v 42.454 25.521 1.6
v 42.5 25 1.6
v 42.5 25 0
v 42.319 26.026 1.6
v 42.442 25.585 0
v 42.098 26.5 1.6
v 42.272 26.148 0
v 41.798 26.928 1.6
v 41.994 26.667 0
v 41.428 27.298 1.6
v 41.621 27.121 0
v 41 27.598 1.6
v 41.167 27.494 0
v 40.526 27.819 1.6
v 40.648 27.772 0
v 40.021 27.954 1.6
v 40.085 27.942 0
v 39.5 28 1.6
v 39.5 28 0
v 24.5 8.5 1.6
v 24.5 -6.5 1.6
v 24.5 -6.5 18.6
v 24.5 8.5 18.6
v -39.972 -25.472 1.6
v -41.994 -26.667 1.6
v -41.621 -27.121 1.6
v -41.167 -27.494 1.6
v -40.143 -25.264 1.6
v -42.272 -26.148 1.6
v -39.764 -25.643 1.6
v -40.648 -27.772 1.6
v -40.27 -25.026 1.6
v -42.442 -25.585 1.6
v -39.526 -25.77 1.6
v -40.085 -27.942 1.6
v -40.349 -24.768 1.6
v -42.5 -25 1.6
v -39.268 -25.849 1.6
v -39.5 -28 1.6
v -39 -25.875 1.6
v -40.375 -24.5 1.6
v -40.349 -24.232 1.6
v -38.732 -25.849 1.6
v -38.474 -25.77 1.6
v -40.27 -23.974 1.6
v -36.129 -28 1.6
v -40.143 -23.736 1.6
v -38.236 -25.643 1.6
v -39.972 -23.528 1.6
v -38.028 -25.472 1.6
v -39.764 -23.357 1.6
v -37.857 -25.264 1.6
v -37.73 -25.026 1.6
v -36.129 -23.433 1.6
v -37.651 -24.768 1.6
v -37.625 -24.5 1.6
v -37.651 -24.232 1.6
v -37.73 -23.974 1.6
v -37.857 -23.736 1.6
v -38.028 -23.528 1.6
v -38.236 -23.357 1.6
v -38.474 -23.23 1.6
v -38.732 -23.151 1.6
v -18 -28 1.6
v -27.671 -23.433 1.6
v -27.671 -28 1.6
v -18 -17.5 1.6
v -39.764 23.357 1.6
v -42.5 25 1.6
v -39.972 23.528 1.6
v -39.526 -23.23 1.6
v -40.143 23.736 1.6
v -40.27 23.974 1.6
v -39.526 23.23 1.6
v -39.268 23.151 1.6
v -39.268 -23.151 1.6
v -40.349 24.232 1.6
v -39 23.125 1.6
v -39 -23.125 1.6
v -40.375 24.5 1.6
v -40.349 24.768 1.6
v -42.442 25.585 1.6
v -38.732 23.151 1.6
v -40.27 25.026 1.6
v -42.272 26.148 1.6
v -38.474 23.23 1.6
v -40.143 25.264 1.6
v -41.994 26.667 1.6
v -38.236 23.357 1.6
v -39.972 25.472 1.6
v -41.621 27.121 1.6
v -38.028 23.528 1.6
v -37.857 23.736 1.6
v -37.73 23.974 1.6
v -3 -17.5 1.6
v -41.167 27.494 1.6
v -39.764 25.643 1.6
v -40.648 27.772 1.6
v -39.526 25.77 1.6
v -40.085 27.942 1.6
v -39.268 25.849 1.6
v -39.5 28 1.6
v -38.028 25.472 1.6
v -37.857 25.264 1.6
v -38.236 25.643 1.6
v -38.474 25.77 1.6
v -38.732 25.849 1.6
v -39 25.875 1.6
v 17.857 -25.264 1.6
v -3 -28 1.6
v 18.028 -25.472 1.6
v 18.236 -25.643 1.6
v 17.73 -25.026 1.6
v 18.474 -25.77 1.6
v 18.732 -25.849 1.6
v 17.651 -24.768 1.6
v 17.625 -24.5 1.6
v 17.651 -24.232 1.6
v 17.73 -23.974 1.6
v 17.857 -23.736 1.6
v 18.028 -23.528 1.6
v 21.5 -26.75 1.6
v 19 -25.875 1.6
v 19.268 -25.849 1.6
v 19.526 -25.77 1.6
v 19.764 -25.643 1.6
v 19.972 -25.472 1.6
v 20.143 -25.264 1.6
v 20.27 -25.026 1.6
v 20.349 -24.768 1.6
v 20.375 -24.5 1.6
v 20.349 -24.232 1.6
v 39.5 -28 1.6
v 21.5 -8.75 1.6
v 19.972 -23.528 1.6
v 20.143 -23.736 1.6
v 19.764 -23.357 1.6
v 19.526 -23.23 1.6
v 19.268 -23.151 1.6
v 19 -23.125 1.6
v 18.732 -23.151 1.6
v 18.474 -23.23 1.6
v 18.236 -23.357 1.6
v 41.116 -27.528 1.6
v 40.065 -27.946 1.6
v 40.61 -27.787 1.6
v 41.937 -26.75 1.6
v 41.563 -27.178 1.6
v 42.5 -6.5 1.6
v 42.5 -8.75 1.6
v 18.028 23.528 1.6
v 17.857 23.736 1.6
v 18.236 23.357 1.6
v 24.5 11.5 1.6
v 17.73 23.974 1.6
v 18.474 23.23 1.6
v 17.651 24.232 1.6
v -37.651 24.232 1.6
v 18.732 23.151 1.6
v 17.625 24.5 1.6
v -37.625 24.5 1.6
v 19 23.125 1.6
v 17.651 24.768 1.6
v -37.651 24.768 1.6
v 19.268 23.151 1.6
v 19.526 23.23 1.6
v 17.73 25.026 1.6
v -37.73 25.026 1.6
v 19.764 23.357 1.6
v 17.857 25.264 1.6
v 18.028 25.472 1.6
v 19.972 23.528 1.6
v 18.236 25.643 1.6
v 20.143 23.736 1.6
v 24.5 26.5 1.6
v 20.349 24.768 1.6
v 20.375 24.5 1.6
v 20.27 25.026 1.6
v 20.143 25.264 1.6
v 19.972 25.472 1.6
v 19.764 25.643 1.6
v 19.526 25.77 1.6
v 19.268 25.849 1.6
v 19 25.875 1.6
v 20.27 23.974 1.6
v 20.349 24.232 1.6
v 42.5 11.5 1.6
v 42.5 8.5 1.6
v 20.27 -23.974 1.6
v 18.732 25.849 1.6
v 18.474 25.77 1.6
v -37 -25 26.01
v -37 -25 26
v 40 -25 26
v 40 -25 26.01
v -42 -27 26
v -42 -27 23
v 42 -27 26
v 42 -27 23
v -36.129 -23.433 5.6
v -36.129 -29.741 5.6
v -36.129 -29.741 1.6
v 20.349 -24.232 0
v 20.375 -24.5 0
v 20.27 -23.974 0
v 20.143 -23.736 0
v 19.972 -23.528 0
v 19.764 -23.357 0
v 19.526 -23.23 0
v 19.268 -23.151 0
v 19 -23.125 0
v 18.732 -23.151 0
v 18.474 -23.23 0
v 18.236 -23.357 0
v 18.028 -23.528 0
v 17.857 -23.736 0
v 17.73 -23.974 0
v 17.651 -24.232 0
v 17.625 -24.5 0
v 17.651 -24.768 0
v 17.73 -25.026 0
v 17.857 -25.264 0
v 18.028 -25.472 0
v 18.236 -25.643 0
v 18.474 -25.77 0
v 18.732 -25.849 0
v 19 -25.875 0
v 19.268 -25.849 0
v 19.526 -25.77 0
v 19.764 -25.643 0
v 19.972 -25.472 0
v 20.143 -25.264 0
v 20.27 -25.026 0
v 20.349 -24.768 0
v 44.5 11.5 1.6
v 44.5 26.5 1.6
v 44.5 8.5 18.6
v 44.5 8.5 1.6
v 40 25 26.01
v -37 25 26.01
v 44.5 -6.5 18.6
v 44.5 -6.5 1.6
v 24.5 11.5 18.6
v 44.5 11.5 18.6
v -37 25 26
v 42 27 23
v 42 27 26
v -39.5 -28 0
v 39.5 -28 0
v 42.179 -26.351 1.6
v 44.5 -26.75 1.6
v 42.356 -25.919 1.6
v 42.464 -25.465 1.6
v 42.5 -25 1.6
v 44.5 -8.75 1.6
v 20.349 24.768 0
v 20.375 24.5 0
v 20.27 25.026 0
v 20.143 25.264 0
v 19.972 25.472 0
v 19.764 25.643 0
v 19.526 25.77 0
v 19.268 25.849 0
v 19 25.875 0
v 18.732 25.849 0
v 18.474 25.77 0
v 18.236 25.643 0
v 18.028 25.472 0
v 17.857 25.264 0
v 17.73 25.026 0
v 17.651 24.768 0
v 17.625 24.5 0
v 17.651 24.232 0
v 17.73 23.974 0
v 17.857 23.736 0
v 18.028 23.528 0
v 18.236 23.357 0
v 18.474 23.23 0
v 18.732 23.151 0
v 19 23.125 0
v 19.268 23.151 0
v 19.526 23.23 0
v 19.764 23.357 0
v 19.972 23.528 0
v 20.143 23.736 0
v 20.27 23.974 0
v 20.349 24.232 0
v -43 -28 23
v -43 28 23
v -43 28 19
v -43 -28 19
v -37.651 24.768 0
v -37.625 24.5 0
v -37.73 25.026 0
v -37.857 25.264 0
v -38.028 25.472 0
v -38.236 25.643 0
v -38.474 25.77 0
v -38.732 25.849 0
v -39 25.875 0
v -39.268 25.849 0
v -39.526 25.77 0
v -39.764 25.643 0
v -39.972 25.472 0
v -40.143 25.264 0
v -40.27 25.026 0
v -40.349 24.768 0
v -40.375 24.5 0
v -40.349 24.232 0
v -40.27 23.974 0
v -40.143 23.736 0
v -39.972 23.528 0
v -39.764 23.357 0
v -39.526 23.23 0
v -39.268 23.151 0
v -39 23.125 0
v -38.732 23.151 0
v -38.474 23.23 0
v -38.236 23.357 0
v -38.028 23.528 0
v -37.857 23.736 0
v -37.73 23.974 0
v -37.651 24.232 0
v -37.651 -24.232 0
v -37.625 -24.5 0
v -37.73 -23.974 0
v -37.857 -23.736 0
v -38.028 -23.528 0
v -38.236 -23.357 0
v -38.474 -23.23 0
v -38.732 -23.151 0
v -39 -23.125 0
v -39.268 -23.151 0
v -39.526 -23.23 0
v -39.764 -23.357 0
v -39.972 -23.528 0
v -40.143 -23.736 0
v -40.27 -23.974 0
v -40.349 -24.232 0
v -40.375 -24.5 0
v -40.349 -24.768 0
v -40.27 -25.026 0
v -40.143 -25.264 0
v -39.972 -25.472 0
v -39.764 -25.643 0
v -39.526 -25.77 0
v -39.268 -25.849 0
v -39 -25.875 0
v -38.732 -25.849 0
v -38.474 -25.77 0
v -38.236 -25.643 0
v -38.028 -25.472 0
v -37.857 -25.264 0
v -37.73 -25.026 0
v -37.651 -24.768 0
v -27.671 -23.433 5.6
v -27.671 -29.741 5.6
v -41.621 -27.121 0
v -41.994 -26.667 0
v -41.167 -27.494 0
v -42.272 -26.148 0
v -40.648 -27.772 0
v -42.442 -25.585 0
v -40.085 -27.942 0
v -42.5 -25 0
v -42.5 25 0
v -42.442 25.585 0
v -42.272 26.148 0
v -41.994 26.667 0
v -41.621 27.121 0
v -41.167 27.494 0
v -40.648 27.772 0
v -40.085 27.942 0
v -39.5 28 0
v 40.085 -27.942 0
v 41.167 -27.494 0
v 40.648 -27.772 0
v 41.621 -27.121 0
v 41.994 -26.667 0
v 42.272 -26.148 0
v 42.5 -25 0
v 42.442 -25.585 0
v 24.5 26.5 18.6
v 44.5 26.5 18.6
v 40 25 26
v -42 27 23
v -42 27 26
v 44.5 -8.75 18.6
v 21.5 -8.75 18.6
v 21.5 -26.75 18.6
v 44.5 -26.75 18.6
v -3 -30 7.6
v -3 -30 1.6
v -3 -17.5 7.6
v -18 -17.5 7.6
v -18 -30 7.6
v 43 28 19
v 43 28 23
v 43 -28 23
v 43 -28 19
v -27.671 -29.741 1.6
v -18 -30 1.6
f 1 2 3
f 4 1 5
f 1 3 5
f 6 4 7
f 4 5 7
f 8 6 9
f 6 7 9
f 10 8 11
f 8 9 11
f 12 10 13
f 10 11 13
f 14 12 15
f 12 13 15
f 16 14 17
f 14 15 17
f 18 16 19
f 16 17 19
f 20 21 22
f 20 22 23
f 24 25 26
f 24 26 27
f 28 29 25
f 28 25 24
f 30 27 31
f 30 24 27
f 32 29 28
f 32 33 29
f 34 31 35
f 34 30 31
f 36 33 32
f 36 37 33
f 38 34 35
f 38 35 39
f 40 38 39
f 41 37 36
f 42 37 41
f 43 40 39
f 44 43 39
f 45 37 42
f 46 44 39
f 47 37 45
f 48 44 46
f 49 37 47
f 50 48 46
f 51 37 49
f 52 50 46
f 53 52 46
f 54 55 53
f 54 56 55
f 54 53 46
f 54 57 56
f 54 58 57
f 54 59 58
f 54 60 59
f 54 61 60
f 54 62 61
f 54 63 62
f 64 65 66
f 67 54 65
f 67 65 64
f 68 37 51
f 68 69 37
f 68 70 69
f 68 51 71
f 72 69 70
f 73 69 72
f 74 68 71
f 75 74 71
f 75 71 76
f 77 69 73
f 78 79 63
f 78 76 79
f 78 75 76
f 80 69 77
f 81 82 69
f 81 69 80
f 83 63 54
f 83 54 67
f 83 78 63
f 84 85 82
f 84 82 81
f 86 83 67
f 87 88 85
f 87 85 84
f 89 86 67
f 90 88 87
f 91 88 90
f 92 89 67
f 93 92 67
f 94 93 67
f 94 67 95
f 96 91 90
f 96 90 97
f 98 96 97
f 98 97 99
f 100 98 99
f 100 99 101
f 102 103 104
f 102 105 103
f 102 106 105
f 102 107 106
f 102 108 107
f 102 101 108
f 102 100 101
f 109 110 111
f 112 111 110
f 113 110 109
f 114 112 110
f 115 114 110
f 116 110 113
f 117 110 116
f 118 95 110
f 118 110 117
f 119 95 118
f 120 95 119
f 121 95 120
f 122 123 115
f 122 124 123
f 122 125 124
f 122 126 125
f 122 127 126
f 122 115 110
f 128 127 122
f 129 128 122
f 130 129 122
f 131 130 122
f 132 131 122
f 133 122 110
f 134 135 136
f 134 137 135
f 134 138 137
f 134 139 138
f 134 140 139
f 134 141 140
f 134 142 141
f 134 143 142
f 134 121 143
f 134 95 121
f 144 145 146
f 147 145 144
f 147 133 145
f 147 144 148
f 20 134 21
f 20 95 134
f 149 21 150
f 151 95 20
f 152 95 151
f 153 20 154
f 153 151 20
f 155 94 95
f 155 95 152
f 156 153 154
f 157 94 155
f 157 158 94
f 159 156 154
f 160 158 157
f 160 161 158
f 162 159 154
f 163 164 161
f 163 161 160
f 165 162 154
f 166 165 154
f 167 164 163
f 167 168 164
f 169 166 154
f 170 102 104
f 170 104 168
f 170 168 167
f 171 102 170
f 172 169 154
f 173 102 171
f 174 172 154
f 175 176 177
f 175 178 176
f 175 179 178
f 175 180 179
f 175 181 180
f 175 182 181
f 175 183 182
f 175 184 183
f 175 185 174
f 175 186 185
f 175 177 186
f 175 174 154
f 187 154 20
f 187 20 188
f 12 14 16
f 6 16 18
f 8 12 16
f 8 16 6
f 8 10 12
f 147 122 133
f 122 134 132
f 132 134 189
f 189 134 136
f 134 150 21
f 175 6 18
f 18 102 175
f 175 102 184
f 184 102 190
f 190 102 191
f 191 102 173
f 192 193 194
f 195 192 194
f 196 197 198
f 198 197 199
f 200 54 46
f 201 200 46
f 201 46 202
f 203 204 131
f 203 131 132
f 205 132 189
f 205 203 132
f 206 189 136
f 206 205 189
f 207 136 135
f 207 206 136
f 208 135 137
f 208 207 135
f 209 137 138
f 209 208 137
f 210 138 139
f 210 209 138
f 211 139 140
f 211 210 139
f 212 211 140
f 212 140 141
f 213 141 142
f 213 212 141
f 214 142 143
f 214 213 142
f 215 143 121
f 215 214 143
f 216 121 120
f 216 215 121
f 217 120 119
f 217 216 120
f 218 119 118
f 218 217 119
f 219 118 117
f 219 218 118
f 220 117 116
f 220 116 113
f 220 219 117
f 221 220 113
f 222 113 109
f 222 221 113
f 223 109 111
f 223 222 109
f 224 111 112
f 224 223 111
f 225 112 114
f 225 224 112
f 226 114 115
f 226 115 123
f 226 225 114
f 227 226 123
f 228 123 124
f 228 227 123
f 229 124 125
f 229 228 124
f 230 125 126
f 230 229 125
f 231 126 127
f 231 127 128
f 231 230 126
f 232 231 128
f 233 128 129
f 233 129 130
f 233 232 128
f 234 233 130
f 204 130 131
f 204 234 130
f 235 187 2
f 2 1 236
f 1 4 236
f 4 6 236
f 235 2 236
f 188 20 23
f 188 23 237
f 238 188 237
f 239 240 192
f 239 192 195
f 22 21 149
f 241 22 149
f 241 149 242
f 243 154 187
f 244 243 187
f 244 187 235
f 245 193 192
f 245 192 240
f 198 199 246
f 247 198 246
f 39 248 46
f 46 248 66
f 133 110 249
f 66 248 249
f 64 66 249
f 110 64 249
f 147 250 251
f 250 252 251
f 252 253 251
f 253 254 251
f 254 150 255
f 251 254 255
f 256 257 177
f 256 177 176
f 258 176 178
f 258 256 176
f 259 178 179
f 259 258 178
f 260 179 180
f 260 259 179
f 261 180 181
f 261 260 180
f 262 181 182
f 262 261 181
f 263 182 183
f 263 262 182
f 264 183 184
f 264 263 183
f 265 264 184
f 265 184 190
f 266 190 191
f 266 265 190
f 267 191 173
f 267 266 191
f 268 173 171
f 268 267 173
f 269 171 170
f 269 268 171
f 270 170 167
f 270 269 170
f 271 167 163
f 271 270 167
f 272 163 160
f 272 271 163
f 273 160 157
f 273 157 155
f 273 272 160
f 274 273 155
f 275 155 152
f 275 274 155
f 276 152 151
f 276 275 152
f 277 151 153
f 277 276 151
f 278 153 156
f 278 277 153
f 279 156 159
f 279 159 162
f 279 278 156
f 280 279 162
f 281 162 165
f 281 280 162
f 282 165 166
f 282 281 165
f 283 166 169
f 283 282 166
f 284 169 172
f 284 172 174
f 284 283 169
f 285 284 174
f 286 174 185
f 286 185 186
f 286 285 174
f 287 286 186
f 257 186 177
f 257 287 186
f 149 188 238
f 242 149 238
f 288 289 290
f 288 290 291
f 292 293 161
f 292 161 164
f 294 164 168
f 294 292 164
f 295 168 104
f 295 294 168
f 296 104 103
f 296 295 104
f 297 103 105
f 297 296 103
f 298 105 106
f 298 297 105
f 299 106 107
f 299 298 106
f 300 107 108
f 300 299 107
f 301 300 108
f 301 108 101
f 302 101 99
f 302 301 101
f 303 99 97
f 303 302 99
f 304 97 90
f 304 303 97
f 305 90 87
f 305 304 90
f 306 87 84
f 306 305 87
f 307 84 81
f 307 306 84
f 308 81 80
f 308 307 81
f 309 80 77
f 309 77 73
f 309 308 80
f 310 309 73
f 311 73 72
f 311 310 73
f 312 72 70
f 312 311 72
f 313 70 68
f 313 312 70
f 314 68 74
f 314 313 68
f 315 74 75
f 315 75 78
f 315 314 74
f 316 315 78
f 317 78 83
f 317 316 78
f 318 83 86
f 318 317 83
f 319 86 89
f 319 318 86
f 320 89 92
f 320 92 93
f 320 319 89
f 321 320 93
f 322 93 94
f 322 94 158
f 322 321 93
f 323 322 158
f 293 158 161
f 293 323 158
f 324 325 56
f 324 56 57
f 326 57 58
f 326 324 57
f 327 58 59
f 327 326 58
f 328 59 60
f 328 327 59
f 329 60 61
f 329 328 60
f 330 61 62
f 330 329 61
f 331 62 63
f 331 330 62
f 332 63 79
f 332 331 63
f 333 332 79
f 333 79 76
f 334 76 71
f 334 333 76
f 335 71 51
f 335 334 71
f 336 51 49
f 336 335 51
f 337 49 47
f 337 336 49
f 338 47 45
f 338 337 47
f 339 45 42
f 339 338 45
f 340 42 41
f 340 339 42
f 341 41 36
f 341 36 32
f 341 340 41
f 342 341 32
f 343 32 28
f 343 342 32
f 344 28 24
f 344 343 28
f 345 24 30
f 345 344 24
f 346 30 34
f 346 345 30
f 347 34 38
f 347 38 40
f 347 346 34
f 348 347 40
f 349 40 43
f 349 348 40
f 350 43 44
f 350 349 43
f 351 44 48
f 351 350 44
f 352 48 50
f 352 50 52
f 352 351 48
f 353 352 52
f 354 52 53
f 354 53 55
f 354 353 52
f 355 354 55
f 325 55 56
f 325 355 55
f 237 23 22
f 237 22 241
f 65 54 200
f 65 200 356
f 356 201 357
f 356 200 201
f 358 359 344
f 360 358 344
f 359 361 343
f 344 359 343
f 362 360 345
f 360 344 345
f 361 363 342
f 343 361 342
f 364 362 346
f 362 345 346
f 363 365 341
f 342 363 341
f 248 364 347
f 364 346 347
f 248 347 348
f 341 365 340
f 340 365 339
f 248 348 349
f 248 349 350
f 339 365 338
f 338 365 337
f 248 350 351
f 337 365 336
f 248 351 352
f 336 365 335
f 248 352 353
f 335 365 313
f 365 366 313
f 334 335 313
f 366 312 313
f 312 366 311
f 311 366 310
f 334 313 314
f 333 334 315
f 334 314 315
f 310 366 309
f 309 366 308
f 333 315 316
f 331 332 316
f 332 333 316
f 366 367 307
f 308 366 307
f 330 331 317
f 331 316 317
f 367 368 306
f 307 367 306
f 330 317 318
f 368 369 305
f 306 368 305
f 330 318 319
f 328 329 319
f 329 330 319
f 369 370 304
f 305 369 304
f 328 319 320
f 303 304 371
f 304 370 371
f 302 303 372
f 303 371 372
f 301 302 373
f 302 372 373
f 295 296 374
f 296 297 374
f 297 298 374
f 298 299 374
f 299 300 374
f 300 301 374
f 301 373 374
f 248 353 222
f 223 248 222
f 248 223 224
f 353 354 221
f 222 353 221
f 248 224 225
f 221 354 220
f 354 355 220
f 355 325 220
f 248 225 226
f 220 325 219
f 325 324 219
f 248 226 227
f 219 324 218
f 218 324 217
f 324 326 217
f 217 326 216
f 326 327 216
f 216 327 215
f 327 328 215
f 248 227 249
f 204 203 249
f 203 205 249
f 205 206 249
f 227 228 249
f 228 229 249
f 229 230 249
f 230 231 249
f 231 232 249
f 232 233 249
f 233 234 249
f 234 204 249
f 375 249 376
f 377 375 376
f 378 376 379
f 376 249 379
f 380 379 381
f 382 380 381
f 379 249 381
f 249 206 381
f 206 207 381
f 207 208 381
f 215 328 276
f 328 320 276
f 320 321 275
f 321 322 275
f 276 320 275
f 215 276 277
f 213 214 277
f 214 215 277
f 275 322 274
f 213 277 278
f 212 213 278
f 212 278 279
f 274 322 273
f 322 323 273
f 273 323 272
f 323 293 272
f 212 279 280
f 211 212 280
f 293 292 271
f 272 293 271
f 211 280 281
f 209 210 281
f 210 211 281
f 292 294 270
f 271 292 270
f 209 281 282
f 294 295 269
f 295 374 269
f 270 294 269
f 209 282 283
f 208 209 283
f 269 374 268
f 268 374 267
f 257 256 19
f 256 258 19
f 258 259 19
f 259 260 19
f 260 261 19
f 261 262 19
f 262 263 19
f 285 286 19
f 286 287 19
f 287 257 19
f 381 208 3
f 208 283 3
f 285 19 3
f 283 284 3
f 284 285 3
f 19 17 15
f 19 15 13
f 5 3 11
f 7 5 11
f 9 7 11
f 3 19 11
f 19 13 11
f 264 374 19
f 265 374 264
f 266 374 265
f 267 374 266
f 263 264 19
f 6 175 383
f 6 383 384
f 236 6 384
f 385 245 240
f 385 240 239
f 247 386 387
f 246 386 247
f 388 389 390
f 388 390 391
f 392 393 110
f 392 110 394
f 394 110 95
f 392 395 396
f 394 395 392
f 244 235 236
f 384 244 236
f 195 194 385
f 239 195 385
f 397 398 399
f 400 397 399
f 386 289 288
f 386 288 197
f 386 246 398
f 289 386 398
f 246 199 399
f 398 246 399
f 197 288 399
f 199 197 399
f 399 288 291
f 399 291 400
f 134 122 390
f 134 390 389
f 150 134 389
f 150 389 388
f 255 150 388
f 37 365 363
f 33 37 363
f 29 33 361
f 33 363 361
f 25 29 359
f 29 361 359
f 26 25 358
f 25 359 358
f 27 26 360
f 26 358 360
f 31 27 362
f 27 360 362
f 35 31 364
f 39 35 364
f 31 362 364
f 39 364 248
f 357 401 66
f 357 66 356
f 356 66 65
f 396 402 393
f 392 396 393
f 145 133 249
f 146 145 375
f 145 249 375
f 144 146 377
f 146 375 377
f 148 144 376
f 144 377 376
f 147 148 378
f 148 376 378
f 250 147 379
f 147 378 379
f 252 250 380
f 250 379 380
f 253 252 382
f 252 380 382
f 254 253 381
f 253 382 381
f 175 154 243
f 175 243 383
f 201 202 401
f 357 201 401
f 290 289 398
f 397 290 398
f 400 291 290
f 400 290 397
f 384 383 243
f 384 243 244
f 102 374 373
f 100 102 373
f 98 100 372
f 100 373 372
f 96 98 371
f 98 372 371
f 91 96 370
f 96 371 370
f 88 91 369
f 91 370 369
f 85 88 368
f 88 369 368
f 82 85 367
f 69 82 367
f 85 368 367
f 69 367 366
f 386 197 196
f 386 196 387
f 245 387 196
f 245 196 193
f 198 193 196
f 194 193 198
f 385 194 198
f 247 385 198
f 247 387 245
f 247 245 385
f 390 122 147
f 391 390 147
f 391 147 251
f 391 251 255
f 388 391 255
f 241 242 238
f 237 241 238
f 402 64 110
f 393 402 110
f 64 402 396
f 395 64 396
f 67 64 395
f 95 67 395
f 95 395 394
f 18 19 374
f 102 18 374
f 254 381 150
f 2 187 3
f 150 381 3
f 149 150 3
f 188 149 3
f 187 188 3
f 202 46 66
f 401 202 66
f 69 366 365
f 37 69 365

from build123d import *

# Parameters (mm, degrees)
F0_R      = 1.375
F1_DEPTH  = 1.6
F2_W      = 8.457642
F2_H      = 1.740684
F2_H_2    = 4.566714
F3_DEPTH  = 4
F4_W      = 20
F4_H      = 15
F4_W_2    = 23
F4_H_2    = 18
F5_DEPTH  = 17
F6_W      = 15
F6_H      = 12.5
F7_DEPTH  = 6
F9_W      = 84
F9_H      = 54
F10_DEPTH = 3
F11_W     = 77
F11_H     = 50
F12_DEPTH = 0.01
F13_W     = 86
F13_H     = 56
F14_DEPTH = 4


with BuildPart() as f1:
    # F0 (on Top) → F1 (new body)
    with BuildSketch(Plane.XY):
        with BuildLine():
            Line((-39.5, -28), (39.5, -28))
            ThreePointArc((39.5, -28), (41.62132, -27.12132), (42.5, -25))
            Line((42.5, -25), (42.5, 25))
            ThreePointArc((42.5, 25), (41.62132, 27.12132), (39.5, 28))
            Line((39.5, 28), (-39.5, 28))
            ThreePointArc((-39.5, 28), (-41.62132, 27.12132), (-42.5, 25))
            Line((-42.5, 25), (-42.5, -25))
            ThreePointArc((-42.5, -25), (-41.62132, -27.12132), (-39.5, -28))
        make_face()
        with Locations((-39, -24.5)):
            Circle(F0_R, mode=Mode.SUBTRACT)
        with Locations((19, -24.5)):
            Circle(F0_R, mode=Mode.SUBTRACT)
        with Locations((-39, 24.5)):
            Circle(F0_R, mode=Mode.SUBTRACT)
        with Locations((19, 24.5)):
            Circle(F0_R, mode=Mode.SUBTRACT)
    extrude(amount=F1_DEPTH)

    # F2 (on face) → F3 (join)
    with BuildSketch(Plane.XY.offset(1.6)):
        with Locations((-31.9, -28.870342)):
            Rectangle(F2_W, F2_H)
        with Locations((-31.9, -25.716643)):
            Rectangle(F2_W, F2_H_2)
    extrude(amount=F3_DEPTH)

    # F4 (on face) → F5 (join)
    with BuildSketch(Plane.XY.offset(1.6)):
        with Locations((34.5, 19)):
            Rectangle(F4_W, F4_H)
        with Locations((34.5, 1)):
            Rectangle(F4_W, F4_H)
        with Locations((33, -17.75)):
            Rectangle(F4_W_2, F4_H_2)
    extrude(amount=F5_DEPTH)

    # F6 (on face) → F7 (join)
    with BuildSketch(Plane.XY.offset(1.6)):
        with Locations((-10.5, -23.75)):
            Rectangle(F6_W, F6_H)
    extrude(amount=F7_DEPTH)


with BuildPart() as f10:
    # F9 (on offset) → F10 (new body)
    with BuildSketch(Plane.XY.offset(23)):
        Rectangle(F9_W, F9_H)
    extrude(amount=F10_DEPTH)

    # F11 (on face) → F12 (join)
    with BuildSketch(Plane.XY.offset(26)):
        with Locations((1.5, 0)):
            Rectangle(F11_W, F11_H)
    extrude(amount=F12_DEPTH)

    # F13 (on face) → F14 (join)
    with BuildSketch(Plane(origin=(0, 0, 23), x_dir=(1, 0, 0), z_dir=(0, 0, -1))):
        Rectangle(F13_W, F13_H)
    extrude(amount=F14_DEPTH)


solid = Compound([f1.part, f10.part])
